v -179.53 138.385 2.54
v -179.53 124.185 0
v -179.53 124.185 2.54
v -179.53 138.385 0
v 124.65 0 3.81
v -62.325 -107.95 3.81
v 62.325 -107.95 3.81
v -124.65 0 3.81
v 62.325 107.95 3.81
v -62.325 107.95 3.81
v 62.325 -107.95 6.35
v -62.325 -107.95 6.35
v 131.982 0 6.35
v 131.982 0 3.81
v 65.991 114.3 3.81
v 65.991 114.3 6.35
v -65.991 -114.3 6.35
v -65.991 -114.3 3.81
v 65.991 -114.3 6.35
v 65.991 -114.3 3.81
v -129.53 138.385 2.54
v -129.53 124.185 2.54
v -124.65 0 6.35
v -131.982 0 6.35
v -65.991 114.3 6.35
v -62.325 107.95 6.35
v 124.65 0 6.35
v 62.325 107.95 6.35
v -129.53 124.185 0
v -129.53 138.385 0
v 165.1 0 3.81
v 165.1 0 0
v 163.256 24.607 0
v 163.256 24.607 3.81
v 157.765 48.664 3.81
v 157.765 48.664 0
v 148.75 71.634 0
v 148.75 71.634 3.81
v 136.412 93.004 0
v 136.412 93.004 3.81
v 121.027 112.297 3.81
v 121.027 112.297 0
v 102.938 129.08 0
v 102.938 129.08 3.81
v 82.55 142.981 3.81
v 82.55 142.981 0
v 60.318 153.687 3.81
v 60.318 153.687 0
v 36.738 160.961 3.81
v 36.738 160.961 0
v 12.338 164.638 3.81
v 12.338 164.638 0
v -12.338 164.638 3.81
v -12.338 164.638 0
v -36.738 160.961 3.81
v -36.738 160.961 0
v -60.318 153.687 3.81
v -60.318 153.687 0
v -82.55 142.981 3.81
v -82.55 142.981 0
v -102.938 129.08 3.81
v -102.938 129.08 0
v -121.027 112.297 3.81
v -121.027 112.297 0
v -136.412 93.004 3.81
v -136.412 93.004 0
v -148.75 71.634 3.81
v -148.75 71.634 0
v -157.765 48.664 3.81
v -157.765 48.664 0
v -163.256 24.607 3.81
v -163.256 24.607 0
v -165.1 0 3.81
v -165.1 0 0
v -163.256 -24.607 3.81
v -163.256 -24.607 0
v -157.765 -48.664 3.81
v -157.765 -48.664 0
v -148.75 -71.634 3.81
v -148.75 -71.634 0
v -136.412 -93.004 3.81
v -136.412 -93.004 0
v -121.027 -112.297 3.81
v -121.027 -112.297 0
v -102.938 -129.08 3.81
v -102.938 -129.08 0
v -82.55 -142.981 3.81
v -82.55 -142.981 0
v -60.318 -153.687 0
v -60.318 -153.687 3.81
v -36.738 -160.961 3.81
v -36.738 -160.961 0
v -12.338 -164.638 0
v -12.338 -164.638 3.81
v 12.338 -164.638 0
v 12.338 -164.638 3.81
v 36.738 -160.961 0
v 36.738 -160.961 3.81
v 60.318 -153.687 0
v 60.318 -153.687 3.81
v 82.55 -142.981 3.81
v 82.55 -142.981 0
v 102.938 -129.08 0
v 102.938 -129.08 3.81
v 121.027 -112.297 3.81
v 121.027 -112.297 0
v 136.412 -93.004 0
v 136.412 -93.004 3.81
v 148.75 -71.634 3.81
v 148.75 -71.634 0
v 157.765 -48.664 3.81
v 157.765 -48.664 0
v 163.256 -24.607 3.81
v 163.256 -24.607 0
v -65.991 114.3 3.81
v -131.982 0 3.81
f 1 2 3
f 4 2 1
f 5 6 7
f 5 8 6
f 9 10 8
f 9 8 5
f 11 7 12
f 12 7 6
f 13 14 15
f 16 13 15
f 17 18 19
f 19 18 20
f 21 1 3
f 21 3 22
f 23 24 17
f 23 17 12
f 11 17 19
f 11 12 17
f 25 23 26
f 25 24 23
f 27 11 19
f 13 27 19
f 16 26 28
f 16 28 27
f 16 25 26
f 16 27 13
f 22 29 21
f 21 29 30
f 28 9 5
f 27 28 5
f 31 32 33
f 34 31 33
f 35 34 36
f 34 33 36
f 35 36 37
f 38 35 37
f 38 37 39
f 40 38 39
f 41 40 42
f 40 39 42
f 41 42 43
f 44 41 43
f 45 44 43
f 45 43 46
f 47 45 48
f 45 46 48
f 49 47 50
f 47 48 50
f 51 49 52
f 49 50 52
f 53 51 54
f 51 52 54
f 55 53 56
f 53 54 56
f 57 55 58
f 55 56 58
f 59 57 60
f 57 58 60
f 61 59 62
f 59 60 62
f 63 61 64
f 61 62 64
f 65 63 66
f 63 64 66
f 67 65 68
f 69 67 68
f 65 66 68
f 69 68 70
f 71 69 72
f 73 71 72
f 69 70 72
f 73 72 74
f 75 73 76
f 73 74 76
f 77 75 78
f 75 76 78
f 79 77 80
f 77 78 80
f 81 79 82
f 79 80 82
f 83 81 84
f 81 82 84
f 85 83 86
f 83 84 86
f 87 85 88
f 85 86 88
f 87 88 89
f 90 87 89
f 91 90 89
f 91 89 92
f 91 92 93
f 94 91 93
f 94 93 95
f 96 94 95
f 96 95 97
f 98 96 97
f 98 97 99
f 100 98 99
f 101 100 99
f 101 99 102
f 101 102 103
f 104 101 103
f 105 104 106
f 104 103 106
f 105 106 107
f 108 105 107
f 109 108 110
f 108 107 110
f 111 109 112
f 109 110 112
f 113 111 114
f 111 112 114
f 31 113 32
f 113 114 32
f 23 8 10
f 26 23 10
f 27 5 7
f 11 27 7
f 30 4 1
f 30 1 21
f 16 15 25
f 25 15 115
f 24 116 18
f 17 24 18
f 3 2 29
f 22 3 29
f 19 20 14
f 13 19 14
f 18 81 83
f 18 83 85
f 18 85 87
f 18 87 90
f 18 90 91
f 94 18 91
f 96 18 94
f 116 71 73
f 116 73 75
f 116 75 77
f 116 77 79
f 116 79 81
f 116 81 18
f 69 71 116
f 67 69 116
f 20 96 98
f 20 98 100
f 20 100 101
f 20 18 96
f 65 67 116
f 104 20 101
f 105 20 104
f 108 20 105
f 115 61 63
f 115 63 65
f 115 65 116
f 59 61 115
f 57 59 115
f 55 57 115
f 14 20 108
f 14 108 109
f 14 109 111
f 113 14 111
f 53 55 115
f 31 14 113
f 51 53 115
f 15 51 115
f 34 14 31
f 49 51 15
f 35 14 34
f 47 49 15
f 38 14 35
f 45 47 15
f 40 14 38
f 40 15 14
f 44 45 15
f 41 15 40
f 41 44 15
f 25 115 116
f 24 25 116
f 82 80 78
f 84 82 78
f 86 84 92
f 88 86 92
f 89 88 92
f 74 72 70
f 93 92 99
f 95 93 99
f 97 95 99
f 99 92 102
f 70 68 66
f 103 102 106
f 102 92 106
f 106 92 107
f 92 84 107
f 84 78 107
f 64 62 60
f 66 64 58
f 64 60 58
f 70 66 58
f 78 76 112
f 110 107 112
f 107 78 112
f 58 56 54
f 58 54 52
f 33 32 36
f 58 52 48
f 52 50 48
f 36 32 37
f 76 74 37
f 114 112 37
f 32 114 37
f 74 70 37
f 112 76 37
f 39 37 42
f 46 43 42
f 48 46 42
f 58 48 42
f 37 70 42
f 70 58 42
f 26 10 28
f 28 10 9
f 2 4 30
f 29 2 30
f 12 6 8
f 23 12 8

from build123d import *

# Parameters (mm, degrees)
F0_R     = 165.1
F2_DEPTH = 3.81
F1_W     = 50
F1_H     = 14.2
F3_DEPTH = 2.54
F5_DEPTH = 2.54


with BuildPart() as f2:
    # F0 (on Top) → F2 (new body)
    with BuildSketch(Plane.XY):
        Circle(F0_R)
        Polygon((-65.9911357684, -114.3), (-131.9822715367, 0), (-65.9911357684, 114.3), (65.9911357684, 114.3), (131.9822715367, 0), (65.9911357684, -114.3), align=None, mode=Mode.SUBTRACT)
        Polygon((-65.9911357684, 114.3), (-131.9822715367, 0), (-65.9911357684, -114.3), (65.9911357684, -114.3), (131.9822715367, 0), (65.9911357684, 114.3), align=None)
        Polygon((-62.324961559, -107.95), (-124.649923118, 0), (-62.324961559, 107.95), (62.324961559, 107.95), (124.649923118, 0), (62.324961559, -107.95), align=None, mode=Mode.SUBTRACT)
        Polygon((-62.324961559, 107.95), (-124.649923118, 0), (-62.324961559, -107.95), (62.324961559, -107.95), (124.649923118, 0), (62.324961559, 107.95), align=None)
    extrude(amount=F2_DEPTH)

    # F4 (on face) → F5 (join)
    with BuildSketch(Plane.XY.offset(3.81)):
        Polygon((-65.9911357684, 114.3), (-131.9822715367, 0), (-65.9911357684, -114.3), (65.9911357684, -114.3), (131.9822715367, 0), (65.9911357684, 114.3), align=None)
        Polygon((-62.324961559, -107.95), (-124.649923118, 0), (-62.324961559, 107.95), (62.324961559, 107.95), (124.649923118, 0), (62.324961559, -107.95), align=None, mode=Mode.SUBTRACT)
    extrude(amount=F5_DEPTH)


with BuildPart() as f3:
    # F1 (on face) → F3 (new body)
    with BuildSketch(Plane.XY):
        with Locations((-154.5298546553, 131.2848925591)):
            Rectangle(F1_W, F1_H)
    extrude(amount=F3_DEPTH)


solid = Compound([f2.part, f3.part])
